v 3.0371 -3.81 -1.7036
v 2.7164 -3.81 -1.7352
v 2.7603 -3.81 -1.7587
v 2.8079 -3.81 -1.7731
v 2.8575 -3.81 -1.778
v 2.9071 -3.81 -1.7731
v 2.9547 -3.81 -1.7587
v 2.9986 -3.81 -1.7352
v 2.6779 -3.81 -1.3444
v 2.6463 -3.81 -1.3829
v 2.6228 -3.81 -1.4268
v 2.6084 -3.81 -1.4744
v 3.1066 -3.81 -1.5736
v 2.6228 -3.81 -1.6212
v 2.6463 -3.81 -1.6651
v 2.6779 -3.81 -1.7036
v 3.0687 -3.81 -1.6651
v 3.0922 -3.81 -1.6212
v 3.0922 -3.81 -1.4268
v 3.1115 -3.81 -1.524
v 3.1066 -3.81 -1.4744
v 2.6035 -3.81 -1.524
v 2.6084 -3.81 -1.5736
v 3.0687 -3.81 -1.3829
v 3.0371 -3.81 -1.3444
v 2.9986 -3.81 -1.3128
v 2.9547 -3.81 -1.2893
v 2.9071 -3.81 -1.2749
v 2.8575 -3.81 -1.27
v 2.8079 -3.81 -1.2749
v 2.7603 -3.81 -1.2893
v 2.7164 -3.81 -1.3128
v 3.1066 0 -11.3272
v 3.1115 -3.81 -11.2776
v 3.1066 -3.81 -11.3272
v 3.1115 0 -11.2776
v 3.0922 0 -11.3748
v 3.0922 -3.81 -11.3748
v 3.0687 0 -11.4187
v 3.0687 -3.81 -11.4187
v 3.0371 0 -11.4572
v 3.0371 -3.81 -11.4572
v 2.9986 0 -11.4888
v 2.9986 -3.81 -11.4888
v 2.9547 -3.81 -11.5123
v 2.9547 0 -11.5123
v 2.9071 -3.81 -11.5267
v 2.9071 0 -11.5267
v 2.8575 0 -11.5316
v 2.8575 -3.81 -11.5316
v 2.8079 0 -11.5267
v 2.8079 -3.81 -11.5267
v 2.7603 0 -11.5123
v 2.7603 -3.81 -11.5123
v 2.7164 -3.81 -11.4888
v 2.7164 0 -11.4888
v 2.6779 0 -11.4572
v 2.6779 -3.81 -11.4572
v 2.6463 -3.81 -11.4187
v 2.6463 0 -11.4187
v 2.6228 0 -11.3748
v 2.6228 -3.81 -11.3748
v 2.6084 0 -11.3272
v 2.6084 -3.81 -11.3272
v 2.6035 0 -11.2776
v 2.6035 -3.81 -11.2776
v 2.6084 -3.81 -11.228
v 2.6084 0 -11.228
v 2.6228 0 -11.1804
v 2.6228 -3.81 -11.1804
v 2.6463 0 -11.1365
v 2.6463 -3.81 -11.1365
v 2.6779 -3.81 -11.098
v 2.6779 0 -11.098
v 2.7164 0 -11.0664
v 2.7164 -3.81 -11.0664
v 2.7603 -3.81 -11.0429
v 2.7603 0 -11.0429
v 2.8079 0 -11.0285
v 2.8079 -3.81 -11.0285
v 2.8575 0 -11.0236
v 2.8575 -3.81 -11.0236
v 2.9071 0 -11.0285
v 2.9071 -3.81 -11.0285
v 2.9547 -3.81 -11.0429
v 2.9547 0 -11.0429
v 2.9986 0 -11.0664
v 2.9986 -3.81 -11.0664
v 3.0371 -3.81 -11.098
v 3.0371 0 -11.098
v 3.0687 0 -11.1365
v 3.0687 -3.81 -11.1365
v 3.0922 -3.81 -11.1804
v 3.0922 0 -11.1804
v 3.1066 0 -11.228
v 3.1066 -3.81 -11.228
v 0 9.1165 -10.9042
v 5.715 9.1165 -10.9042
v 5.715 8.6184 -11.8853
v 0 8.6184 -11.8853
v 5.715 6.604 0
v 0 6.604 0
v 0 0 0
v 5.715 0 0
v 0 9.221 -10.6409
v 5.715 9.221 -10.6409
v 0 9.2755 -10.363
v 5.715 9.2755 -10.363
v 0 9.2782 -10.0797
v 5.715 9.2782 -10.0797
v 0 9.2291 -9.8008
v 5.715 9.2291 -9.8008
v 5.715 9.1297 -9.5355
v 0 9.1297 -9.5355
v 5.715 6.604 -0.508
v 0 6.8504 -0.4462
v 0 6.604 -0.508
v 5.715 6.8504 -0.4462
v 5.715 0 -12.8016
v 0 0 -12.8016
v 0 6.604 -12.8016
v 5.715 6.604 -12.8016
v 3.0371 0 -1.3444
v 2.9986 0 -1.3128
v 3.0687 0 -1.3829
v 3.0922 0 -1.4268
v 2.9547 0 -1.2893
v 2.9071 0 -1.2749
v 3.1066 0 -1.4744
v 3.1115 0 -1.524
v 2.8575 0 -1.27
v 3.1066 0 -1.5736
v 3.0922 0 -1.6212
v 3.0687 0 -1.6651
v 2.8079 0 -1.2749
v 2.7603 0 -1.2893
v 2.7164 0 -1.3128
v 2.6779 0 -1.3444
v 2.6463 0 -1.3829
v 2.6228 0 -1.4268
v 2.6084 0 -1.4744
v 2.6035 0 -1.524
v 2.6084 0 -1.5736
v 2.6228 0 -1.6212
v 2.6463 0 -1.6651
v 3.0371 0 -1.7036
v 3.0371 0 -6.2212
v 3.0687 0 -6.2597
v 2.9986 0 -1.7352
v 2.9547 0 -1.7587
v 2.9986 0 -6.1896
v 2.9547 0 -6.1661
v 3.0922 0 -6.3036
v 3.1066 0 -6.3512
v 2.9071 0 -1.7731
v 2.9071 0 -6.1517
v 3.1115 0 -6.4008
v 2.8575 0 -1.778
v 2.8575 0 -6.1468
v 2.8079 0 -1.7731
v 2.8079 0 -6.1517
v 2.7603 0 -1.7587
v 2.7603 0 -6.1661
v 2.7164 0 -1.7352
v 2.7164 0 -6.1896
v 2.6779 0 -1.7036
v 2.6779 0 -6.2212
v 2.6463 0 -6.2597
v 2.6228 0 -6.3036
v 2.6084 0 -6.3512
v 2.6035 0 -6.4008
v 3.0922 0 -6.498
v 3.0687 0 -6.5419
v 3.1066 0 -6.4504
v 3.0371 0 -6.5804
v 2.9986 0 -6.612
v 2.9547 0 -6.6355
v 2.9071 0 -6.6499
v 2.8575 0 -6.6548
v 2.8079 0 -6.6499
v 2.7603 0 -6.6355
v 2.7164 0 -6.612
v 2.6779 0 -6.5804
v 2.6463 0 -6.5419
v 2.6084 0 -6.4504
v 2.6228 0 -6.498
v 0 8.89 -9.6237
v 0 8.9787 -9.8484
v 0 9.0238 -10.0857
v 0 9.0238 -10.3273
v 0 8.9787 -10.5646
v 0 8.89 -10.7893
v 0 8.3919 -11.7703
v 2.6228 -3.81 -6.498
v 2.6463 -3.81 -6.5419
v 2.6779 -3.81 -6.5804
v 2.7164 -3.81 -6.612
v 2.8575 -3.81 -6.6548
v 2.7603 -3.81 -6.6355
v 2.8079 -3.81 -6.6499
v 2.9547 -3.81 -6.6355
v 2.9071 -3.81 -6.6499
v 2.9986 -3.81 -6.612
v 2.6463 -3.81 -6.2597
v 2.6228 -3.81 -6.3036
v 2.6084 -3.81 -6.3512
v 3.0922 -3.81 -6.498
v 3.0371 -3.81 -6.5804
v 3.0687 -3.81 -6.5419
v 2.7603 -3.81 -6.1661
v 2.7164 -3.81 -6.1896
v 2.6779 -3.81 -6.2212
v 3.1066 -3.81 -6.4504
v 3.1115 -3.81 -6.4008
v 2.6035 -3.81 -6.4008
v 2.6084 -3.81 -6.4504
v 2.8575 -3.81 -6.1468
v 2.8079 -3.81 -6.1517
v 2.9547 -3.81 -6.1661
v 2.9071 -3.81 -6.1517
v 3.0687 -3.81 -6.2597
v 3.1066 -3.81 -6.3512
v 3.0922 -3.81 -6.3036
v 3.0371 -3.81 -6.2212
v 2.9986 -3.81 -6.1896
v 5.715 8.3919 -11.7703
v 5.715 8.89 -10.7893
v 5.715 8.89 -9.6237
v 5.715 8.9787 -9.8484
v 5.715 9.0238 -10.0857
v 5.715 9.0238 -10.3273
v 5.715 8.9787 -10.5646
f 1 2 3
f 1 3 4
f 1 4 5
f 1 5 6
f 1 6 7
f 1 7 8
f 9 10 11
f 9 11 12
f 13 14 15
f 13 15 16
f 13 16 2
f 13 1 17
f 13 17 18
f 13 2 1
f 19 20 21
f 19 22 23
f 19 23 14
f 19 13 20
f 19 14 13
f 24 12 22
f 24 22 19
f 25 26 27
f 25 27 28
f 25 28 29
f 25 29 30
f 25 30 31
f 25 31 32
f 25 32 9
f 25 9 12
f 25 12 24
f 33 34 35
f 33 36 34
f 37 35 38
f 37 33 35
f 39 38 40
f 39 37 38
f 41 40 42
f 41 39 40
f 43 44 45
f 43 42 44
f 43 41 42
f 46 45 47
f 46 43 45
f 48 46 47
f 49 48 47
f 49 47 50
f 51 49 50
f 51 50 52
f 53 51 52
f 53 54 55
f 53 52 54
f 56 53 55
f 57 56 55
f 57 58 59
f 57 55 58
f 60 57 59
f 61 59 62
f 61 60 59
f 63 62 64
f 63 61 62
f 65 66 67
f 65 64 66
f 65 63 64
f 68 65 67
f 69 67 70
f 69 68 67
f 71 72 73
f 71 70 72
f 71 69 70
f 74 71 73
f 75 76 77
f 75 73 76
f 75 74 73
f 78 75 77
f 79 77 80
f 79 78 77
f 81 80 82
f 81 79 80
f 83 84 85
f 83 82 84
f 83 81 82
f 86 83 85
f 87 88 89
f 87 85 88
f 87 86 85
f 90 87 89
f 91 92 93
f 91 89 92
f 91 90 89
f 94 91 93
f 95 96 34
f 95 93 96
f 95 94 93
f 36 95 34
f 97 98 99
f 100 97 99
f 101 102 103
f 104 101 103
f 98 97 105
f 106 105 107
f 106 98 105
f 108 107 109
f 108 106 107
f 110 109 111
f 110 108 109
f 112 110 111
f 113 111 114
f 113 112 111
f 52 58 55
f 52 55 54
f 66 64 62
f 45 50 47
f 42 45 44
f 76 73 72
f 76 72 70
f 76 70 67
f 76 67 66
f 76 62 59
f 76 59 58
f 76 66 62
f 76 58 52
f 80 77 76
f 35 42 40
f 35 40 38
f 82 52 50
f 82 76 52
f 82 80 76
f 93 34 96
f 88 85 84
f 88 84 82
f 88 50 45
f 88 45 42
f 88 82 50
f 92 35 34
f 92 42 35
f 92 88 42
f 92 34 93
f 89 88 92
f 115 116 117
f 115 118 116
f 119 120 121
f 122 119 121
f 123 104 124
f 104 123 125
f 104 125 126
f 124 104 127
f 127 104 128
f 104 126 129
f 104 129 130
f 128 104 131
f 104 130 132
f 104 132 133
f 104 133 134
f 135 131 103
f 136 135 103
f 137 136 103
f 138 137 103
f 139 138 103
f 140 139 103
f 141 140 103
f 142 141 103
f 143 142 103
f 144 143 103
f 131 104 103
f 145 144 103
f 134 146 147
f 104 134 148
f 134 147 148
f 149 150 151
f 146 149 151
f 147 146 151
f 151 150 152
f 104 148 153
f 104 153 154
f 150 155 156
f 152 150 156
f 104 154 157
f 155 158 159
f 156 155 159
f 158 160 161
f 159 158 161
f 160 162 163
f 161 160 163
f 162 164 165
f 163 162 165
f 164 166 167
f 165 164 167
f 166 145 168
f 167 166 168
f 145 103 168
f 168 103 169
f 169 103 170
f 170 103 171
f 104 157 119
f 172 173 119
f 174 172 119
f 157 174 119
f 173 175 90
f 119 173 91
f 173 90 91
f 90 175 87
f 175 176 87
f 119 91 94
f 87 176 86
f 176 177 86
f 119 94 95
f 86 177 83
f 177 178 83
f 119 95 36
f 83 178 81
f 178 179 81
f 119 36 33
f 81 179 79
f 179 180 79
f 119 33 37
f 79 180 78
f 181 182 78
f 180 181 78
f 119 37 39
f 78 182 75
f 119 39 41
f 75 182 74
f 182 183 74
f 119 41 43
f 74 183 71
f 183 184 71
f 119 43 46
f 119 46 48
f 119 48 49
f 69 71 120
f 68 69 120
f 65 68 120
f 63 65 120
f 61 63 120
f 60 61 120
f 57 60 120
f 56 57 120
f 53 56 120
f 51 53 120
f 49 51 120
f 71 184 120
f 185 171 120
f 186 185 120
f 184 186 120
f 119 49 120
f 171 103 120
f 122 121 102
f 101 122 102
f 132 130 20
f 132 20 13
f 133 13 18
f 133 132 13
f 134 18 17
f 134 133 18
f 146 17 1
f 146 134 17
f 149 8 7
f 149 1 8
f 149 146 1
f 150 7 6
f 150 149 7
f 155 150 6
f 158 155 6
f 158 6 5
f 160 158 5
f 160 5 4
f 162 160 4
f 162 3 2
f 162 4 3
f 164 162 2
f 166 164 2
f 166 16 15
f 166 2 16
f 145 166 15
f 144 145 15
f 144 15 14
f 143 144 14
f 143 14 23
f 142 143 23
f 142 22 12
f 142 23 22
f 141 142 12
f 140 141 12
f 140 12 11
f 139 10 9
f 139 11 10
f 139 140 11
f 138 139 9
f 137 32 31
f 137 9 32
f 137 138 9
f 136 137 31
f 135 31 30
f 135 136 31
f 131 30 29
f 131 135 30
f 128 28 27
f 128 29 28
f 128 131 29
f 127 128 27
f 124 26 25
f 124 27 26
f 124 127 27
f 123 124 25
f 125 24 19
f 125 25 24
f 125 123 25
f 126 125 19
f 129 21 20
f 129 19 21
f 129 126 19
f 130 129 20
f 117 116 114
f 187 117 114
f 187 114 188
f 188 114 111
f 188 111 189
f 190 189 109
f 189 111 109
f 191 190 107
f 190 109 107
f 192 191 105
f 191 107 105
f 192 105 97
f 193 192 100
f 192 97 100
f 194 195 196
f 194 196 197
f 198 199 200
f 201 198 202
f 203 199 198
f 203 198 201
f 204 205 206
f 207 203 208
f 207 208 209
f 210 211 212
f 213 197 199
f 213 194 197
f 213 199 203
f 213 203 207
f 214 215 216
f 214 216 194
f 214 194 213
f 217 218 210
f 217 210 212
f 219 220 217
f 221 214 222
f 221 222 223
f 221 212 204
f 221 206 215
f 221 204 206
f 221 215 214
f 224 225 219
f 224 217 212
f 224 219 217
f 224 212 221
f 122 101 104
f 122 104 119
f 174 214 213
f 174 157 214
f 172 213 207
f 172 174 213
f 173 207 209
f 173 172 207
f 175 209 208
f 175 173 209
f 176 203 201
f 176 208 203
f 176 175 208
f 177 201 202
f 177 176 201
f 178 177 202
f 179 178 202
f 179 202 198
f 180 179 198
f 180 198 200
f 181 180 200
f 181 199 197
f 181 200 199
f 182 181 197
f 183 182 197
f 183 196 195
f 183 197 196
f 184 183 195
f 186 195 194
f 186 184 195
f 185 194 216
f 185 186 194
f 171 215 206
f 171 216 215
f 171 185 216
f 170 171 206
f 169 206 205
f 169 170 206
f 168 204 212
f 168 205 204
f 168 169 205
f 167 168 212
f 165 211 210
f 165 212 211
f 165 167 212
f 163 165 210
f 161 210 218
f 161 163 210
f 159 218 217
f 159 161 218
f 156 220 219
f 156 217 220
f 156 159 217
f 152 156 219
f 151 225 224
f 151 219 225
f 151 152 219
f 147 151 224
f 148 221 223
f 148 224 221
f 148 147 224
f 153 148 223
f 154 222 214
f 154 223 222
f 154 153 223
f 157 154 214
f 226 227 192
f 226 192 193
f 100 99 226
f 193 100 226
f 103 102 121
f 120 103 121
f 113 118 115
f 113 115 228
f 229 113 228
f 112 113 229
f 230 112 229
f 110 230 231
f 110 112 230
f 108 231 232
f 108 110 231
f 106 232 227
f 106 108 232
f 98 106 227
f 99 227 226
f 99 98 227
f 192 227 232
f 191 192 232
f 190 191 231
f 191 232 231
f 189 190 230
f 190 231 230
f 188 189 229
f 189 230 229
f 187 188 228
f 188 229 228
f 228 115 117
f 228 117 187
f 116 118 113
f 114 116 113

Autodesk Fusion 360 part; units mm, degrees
sketch "Sketch1" plane through (0, 0, 0) normal (1, 0, 0) x (0, 0, -1)
  line L0 (0, 0) -> (12.8016, 0)
  line L1 (12.8016, 0) -> (12.8016, 6.604)
  line L2 (12.8016, 6.604) -> (0, 6.604)
  line L3 (0, 6.604) -> (0, 0)
  dimension "d1" = 12.8016
  dimension "d2" = 6.604
extrude "Extrude1" add sketch "Sketch1" along normal blind 5.715 makes body 1
sketch "Sketch2" plane through (0, 6.604, 0) normal (0, 1, 0) x (-1, 0, 0)
  line L0 (0, -12.8016) -> (0, 0)
  line L1 (0, 0) -> (-5.715, 0)
  line L2 (-5.715, 0) -> (-5.715, -12.8016)
  line L3 (-5.715, -12.8016) -> (0, -12.8016)
sketch "Sketch3" plane through (0, 0, 0) normal (0, -1, 0) x (1, 0, 0)
  line L0 (0, 0) -> (0, -12.8016)
  line L1 (0, -12.8016) -> (5.715, -12.8016)
  line L2 (5.715, -12.8016) -> (5.715, 0)
  line L3 (5.715, 0) -> (0, 0)
  circle A0 centre (2.8575, -1.524) radius 0.254
  line L4 (2.8575, 0) -> (2.8575, -12.8016) construction
  circle A1 centre (2.8575, -6.4008) radius 0.254
  circle A2 centre (2.8575, -11.2776) radius 0.254
  line L5 (5.715, -6.4008) -> (0, -6.4008) construction
  dimension "d5" = 0.508
  dimension "d6" = 0.508
  dimension "d7" = 0.508
  dimension "d8" = 1.524
  dimension "d9" = 1.524
extrude "Extrude2" add sketch "Sketch3" along normal blind 3.81 contours A0 | A1 | A2 bodies 1
sketch "Sketch4" plane through (5.715, 0, 0) normal (1, 0, 0) x (0, 0, -1)
  line L0 (0, 6.604) -> (0, 0)
  line L1 (0, 0) -> (12.8016, 0)
  line L2 (12.8016, 0) -> (12.8016, 6.604)
  line L3 (12.8016, 6.604) -> (0, 6.604)
  line L4 (0.508, 6.604) -> (9.6237, 8.89)
  arc A0 (10.7893, 8.89) -> (9.6237, 8.89) centre (10.2065, 7.7422) ccw
  line L5 (10.7893, 8.89) -> (11.7703, 8.3919)
  line L6 (0.4462, 6.8504) -> (9.5355, 9.1297)
  arc A1 (10.9042, 9.1165) -> (9.5355, 9.1297) centre (10.2065, 7.7422) ccw
  line L7 (10.9042, 9.1165) -> (11.8853, 8.6184)
  line L8 (11.8853, 8.6184) -> (11.7703, 8.3919)
  line L9 (0.4462, 6.8504) -> (0.508, 6.604)
  point P0 (0.508, 6.604)
  dimension "d12" = 0.508
  dimension "d13" = 9.398
  dimension "d14" = 2.286
  dimension "d15" = 0.254
extrude "Extrude3" add sketch "Sketch4" against normal blind 5.715 separate body contours L4 A0 L5 L6 A1 L7 L8 L9 makes body 2
